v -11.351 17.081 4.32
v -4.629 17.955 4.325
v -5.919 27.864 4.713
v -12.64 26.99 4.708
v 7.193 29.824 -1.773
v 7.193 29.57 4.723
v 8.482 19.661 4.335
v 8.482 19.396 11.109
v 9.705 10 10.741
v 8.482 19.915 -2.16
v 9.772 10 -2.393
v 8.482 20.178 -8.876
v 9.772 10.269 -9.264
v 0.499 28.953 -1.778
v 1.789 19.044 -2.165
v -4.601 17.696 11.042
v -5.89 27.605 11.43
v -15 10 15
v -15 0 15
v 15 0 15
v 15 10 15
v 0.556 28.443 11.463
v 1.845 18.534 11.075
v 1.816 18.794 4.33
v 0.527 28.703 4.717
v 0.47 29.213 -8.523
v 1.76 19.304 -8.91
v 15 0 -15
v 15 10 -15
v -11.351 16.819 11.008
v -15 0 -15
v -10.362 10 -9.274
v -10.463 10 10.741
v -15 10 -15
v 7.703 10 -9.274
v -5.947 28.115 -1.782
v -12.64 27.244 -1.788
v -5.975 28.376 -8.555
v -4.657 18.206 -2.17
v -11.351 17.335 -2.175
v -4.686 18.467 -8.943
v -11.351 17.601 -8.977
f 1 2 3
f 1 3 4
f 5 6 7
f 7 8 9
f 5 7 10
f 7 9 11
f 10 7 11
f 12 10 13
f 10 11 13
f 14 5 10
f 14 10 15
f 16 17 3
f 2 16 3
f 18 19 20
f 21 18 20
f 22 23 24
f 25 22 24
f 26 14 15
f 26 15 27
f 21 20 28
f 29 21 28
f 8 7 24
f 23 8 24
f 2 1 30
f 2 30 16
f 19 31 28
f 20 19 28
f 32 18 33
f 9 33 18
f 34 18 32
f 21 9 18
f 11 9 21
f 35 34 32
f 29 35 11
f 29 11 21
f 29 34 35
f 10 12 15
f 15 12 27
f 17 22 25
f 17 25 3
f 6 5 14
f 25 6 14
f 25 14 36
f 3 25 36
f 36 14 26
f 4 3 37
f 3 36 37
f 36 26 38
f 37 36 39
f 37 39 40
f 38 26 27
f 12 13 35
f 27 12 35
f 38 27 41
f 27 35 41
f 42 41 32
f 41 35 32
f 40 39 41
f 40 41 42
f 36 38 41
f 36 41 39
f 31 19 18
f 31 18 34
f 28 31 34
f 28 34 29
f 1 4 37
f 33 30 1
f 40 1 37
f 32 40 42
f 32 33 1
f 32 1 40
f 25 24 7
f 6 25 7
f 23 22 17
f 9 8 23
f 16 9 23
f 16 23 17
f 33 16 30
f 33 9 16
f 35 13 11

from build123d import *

# Parameters (mm, degrees)
SKETCH1_W           = 30
SKETCH1_H           = 30
BOSS_EXTRUDE1_DEPTH = 10
SKETCH2_W           = 20
SKETCH2_H           = 20
BOSS_EXTRUDE2_DEPTH = 20
CUT_EXTRUDE3_DEPTH  = 10


with BuildPart() as part:
    # Sketch1 → Boss-Extrude1 (new body)
    with BuildSketch(Plane(origin=(0, 0, 0), x_dir=(1, 0, 0), z_dir=(0, 1, 0))):
        Rectangle(SKETCH1_W, SKETCH1_H)
    extrude(amount=BOSS_EXTRUDE1_DEPTH)

    # Sketch2 → Boss-Extrude2 (add)
    with BuildSketch(Plane(origin=(-19.996706831, 6.023656636, 0.235617172), x_dir=(-0.9916527006816696, -0.12883913939699687, -0.005039582343056198), z_dir=(0.12893766412786933, -0.9908949522292337, -0.03875915912237427))):
        with Locations((-20.018899737, -0.342067519)):
            Rectangle(SKETCH2_W, SKETCH2_H)
    extrude(amount=-BOSS_EXTRUDE2_DEPTH)

    # Sketch5 → Cut-Extrude3 (cut)
    with BuildSketch(Plane(origin=(-2.292112058, 28.477077557, 1.107866318), x_dir=(0.9916435574745326, 0.12900579254219657, 0.0007486052452988832), z_dir=(-0.12893766412786928, 0.9908949522292337, 0.03875915912237423))):
        Polygon((-3.672779426, -10.332409771), (-3.672779426, -3.610260169), (-10.450784263, -3.610260169), (-10.479525344, -10.303179891), align=None)
        Polygon((2.827220574, -10.360322406), (2.827220574, -3.610200238), (9.549400399, -3.610200238), (9.520290252, -10.389064131), align=None)
        Polygon((-10.393641105, 9.696635705), (-3.672779426, 9.667774634), (-3.672779426, 2.889739831), (-10.422871628, 2.889739831), align=None)
        Polygon((9.606174491, 9.610751466), (9.577312777, 2.889739831), (2.827220574, 2.889739831), (2.827220574, 9.639861999), align=None)
    extrude(amount=-CUT_EXTRUDE3_DEPTH, mode=Mode.SUBTRACT)


solid = part.part
